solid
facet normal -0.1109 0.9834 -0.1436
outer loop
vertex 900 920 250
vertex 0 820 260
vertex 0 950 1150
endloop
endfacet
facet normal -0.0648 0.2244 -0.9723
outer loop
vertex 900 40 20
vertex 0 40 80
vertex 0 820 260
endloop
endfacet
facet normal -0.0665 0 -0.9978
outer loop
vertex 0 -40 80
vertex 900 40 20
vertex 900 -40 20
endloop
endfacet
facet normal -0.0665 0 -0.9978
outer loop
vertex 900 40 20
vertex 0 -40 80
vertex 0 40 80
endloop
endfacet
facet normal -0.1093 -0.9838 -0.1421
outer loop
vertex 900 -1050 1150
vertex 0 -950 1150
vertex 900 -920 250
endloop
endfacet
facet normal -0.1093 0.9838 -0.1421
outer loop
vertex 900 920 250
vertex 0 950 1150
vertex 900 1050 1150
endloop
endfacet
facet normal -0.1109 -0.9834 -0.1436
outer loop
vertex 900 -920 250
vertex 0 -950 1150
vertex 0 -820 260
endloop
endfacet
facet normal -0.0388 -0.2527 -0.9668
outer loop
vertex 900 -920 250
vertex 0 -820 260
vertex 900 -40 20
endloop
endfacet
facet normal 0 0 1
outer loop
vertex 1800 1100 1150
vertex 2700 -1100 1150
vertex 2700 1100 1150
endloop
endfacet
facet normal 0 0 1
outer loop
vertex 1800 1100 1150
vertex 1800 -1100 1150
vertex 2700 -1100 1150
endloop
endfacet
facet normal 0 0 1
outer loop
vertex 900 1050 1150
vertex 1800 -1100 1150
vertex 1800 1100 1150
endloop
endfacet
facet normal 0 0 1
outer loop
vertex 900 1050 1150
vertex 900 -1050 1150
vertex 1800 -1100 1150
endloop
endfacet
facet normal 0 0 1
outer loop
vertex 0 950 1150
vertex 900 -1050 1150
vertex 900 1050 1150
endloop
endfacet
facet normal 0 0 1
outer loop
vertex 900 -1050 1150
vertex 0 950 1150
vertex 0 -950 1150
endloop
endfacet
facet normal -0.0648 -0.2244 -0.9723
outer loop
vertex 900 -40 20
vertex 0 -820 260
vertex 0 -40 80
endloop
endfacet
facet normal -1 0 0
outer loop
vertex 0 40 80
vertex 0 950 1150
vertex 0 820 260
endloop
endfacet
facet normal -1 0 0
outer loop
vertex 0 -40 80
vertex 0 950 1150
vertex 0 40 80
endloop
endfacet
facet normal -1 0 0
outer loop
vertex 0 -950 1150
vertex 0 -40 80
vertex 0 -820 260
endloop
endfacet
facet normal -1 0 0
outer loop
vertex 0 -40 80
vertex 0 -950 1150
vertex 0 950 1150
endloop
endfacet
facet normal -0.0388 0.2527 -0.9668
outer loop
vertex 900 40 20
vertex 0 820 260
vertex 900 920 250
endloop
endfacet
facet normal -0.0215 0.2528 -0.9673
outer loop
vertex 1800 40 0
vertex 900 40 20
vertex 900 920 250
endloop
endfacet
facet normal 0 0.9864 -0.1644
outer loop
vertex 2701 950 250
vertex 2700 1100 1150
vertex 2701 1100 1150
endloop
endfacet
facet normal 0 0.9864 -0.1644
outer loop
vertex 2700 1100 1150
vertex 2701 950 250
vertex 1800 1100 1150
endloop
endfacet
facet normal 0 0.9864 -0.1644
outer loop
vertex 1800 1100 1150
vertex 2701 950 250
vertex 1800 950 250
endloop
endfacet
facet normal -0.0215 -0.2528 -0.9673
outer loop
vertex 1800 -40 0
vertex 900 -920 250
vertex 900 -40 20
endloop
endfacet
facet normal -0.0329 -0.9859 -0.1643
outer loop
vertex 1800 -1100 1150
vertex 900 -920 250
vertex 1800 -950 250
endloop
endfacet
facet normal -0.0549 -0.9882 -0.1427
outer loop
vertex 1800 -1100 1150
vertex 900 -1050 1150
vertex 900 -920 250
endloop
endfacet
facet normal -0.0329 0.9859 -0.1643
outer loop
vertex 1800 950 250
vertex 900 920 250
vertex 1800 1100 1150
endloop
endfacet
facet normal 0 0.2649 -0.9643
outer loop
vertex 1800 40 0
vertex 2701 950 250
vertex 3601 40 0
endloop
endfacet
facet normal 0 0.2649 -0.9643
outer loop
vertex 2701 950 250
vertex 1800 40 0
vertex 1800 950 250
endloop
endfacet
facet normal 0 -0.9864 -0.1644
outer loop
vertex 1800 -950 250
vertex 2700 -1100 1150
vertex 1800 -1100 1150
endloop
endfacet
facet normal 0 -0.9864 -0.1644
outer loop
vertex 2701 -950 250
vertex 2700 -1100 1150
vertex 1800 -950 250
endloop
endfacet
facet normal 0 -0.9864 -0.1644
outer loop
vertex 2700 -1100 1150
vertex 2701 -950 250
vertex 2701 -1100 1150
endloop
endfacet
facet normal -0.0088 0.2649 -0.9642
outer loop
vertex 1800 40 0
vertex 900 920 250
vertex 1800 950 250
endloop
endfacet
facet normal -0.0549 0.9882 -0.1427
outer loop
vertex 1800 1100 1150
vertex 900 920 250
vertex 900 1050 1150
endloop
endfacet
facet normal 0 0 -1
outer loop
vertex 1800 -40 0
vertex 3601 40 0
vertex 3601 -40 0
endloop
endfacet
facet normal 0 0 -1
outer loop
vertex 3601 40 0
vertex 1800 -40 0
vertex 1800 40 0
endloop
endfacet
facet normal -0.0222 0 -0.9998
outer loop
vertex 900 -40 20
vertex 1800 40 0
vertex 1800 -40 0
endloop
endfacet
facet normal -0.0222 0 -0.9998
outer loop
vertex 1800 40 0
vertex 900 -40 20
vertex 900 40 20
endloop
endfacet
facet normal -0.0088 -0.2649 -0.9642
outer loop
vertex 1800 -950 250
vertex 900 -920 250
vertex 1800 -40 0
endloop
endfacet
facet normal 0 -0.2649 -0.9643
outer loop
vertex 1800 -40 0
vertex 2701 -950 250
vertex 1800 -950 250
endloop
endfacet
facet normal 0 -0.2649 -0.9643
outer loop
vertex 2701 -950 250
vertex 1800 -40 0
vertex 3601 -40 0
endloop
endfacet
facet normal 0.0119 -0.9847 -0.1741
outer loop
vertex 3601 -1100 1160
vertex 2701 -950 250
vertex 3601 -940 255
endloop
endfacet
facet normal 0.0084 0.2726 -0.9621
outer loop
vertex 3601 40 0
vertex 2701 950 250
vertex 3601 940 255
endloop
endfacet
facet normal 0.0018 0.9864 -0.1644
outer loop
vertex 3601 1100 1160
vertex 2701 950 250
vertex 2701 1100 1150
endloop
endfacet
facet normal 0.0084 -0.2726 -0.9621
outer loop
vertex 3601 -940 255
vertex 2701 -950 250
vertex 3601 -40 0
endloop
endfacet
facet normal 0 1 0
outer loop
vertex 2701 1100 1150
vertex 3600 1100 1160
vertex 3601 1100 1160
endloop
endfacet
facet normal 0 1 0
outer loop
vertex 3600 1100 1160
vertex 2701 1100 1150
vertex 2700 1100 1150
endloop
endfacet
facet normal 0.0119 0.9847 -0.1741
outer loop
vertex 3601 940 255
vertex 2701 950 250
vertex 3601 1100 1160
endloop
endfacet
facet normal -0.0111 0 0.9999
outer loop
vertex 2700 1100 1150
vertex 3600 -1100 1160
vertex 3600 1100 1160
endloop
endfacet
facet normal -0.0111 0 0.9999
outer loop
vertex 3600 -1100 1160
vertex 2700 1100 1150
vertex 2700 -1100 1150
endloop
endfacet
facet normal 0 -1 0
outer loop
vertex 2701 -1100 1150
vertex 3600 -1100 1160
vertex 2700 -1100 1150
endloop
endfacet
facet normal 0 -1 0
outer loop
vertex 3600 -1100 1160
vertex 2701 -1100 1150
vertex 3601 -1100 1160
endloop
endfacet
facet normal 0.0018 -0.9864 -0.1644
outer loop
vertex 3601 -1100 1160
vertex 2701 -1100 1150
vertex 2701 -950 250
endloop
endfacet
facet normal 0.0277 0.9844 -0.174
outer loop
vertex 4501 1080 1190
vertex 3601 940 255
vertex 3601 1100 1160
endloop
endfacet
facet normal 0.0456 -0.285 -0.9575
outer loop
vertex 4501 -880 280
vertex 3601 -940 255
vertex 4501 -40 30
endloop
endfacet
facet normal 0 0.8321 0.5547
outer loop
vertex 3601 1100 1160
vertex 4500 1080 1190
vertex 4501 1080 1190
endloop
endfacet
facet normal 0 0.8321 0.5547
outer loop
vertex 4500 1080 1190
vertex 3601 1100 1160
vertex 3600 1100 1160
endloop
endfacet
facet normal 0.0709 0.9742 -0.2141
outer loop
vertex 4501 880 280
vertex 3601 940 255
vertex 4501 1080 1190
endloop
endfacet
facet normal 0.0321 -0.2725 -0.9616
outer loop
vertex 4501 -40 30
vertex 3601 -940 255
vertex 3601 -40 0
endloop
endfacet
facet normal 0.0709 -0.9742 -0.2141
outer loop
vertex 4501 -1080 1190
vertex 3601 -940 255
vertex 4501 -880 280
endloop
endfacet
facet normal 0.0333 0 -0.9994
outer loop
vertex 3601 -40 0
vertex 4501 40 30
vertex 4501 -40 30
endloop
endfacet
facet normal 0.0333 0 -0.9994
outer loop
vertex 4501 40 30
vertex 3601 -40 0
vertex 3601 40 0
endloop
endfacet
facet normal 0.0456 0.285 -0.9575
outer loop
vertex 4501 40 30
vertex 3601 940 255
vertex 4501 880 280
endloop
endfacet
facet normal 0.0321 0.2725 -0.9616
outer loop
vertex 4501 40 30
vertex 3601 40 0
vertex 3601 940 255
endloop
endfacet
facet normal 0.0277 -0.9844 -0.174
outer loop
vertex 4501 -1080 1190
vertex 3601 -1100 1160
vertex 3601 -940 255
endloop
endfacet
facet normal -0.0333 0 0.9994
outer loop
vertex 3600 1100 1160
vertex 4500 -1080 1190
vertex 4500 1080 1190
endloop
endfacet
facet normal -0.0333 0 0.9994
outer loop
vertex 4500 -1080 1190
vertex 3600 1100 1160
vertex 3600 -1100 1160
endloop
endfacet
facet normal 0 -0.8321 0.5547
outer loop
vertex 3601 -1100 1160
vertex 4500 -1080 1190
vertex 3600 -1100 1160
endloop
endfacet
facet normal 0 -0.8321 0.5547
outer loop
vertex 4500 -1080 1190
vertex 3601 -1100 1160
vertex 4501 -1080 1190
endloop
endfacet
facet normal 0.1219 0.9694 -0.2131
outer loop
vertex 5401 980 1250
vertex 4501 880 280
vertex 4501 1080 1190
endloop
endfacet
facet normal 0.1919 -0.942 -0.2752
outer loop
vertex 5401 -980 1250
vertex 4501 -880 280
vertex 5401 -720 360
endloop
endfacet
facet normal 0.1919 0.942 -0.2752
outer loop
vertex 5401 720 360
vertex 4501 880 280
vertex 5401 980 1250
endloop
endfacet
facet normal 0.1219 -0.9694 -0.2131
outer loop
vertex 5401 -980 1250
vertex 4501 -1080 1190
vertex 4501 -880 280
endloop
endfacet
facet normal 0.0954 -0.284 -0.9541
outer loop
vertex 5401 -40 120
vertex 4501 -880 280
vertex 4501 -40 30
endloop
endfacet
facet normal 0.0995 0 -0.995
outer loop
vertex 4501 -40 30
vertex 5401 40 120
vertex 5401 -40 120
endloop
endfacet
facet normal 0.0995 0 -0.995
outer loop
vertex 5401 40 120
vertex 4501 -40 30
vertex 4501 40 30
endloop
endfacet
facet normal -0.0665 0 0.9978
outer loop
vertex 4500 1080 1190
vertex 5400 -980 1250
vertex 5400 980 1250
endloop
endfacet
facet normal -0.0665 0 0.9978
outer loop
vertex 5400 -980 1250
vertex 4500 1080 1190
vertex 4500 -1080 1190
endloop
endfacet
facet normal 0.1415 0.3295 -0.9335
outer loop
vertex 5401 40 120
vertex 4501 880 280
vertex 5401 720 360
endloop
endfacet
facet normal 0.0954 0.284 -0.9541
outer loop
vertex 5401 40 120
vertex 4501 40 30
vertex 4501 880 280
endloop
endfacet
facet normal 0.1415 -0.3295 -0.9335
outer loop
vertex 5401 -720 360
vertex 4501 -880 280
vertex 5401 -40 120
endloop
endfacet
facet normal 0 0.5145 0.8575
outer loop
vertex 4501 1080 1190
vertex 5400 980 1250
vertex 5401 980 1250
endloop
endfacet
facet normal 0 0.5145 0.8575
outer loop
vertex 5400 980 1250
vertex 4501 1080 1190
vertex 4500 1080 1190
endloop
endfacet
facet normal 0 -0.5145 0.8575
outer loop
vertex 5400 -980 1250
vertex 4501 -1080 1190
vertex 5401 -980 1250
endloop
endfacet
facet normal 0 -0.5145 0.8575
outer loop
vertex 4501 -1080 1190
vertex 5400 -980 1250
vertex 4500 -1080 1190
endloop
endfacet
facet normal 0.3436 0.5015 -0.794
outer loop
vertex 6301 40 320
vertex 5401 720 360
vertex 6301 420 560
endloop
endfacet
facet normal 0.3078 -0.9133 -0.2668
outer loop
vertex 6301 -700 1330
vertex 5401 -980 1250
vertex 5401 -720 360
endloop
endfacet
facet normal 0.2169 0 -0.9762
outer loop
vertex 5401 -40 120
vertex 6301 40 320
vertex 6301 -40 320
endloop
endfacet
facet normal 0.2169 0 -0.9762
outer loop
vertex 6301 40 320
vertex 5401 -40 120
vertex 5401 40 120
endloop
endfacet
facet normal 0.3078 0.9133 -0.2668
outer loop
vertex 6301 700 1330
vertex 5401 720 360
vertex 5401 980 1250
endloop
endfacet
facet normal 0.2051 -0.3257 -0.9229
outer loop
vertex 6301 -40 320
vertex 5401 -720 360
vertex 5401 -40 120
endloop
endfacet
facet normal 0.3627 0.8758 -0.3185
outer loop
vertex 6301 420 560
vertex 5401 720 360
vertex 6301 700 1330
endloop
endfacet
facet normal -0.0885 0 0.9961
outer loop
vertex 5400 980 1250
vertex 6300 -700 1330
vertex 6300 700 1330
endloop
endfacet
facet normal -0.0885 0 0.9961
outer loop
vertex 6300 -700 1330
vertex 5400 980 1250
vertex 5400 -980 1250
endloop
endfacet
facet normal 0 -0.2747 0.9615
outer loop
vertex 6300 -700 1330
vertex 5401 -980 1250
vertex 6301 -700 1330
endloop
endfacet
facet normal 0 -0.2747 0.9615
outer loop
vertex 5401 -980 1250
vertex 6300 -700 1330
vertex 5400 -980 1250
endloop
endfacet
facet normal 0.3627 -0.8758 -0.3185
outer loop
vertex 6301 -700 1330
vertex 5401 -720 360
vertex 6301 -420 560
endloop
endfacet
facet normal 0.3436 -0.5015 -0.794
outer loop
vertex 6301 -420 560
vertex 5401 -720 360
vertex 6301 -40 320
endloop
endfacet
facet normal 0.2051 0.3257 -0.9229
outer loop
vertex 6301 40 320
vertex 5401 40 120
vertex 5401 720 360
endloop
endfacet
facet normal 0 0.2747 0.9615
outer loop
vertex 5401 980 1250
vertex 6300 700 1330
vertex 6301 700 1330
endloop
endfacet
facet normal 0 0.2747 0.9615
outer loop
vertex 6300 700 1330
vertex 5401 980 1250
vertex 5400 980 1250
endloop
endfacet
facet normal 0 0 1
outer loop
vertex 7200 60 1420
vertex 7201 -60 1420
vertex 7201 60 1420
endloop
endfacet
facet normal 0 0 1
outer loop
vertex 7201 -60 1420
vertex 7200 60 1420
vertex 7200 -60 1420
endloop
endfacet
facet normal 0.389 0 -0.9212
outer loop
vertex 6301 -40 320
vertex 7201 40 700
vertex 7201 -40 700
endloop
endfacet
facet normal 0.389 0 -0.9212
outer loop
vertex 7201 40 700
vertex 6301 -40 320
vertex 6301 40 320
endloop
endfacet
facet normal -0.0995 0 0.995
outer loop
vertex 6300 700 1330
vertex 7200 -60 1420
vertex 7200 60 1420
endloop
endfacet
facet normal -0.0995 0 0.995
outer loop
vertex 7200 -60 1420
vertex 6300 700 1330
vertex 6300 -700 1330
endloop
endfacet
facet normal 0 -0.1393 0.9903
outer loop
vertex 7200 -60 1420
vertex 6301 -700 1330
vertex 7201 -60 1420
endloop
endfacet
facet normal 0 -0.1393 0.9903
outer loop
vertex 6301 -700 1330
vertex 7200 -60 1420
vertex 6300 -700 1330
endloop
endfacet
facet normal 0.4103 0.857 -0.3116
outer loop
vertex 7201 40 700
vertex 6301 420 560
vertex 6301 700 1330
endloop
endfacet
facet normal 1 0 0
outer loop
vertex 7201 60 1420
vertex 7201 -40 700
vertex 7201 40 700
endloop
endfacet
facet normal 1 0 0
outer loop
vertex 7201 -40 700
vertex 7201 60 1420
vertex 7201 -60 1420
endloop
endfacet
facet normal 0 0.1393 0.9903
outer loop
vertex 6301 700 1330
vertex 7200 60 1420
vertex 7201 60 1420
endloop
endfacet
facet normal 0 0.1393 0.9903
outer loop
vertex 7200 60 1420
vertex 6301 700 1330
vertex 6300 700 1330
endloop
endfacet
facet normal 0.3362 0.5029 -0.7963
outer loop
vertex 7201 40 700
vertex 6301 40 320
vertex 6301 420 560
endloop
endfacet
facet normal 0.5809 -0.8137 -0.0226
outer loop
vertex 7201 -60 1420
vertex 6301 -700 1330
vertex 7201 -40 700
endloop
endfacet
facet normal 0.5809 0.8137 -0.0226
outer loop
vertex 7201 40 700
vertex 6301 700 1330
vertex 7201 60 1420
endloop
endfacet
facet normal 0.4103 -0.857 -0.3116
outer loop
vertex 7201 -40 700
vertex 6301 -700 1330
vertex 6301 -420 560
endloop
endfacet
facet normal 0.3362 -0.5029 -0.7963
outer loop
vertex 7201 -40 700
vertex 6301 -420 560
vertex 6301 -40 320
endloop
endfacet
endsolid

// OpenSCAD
// file: ../lib/loft.scad
// loft.scad — station lofting.
// hull()-chain over convex sections now; polyhedron skin can replace
// loft_stations() later with the same call signature.

// one thin slab of a section polygon (points in (y,z)) at station x
module station_slab(x, pts) {
  translate([x, 0, 0])
    rotate([90, 0, 90])       // polygon (y,z) -> Y-Z plane, extrude +x
      linear_extrude(1)
        polygon(pts);
}

// stations = [[x, [[y,z], ...]], ...] ordered by x, same winding
module loft_stations(stations) {
  for (i = [0 : len(stations) - 2])
    hull() {
      station_slab(stations[i][0], stations[i][1]);
      station_slab(stations[i + 1][0], stations[i + 1][1]);
    }
}
// main file
// hull.scad — chined main hull lofted from STATIONS
include <../params.scad>
use <../lib/loft.scad>

module hull_body() {
  color("whitesmoke")
    loft_stations([for (st = STATIONS) [st[0], full_section(st)]]);
}

hull_body();   // demo when opened standalone (assembly use<>s this file)
